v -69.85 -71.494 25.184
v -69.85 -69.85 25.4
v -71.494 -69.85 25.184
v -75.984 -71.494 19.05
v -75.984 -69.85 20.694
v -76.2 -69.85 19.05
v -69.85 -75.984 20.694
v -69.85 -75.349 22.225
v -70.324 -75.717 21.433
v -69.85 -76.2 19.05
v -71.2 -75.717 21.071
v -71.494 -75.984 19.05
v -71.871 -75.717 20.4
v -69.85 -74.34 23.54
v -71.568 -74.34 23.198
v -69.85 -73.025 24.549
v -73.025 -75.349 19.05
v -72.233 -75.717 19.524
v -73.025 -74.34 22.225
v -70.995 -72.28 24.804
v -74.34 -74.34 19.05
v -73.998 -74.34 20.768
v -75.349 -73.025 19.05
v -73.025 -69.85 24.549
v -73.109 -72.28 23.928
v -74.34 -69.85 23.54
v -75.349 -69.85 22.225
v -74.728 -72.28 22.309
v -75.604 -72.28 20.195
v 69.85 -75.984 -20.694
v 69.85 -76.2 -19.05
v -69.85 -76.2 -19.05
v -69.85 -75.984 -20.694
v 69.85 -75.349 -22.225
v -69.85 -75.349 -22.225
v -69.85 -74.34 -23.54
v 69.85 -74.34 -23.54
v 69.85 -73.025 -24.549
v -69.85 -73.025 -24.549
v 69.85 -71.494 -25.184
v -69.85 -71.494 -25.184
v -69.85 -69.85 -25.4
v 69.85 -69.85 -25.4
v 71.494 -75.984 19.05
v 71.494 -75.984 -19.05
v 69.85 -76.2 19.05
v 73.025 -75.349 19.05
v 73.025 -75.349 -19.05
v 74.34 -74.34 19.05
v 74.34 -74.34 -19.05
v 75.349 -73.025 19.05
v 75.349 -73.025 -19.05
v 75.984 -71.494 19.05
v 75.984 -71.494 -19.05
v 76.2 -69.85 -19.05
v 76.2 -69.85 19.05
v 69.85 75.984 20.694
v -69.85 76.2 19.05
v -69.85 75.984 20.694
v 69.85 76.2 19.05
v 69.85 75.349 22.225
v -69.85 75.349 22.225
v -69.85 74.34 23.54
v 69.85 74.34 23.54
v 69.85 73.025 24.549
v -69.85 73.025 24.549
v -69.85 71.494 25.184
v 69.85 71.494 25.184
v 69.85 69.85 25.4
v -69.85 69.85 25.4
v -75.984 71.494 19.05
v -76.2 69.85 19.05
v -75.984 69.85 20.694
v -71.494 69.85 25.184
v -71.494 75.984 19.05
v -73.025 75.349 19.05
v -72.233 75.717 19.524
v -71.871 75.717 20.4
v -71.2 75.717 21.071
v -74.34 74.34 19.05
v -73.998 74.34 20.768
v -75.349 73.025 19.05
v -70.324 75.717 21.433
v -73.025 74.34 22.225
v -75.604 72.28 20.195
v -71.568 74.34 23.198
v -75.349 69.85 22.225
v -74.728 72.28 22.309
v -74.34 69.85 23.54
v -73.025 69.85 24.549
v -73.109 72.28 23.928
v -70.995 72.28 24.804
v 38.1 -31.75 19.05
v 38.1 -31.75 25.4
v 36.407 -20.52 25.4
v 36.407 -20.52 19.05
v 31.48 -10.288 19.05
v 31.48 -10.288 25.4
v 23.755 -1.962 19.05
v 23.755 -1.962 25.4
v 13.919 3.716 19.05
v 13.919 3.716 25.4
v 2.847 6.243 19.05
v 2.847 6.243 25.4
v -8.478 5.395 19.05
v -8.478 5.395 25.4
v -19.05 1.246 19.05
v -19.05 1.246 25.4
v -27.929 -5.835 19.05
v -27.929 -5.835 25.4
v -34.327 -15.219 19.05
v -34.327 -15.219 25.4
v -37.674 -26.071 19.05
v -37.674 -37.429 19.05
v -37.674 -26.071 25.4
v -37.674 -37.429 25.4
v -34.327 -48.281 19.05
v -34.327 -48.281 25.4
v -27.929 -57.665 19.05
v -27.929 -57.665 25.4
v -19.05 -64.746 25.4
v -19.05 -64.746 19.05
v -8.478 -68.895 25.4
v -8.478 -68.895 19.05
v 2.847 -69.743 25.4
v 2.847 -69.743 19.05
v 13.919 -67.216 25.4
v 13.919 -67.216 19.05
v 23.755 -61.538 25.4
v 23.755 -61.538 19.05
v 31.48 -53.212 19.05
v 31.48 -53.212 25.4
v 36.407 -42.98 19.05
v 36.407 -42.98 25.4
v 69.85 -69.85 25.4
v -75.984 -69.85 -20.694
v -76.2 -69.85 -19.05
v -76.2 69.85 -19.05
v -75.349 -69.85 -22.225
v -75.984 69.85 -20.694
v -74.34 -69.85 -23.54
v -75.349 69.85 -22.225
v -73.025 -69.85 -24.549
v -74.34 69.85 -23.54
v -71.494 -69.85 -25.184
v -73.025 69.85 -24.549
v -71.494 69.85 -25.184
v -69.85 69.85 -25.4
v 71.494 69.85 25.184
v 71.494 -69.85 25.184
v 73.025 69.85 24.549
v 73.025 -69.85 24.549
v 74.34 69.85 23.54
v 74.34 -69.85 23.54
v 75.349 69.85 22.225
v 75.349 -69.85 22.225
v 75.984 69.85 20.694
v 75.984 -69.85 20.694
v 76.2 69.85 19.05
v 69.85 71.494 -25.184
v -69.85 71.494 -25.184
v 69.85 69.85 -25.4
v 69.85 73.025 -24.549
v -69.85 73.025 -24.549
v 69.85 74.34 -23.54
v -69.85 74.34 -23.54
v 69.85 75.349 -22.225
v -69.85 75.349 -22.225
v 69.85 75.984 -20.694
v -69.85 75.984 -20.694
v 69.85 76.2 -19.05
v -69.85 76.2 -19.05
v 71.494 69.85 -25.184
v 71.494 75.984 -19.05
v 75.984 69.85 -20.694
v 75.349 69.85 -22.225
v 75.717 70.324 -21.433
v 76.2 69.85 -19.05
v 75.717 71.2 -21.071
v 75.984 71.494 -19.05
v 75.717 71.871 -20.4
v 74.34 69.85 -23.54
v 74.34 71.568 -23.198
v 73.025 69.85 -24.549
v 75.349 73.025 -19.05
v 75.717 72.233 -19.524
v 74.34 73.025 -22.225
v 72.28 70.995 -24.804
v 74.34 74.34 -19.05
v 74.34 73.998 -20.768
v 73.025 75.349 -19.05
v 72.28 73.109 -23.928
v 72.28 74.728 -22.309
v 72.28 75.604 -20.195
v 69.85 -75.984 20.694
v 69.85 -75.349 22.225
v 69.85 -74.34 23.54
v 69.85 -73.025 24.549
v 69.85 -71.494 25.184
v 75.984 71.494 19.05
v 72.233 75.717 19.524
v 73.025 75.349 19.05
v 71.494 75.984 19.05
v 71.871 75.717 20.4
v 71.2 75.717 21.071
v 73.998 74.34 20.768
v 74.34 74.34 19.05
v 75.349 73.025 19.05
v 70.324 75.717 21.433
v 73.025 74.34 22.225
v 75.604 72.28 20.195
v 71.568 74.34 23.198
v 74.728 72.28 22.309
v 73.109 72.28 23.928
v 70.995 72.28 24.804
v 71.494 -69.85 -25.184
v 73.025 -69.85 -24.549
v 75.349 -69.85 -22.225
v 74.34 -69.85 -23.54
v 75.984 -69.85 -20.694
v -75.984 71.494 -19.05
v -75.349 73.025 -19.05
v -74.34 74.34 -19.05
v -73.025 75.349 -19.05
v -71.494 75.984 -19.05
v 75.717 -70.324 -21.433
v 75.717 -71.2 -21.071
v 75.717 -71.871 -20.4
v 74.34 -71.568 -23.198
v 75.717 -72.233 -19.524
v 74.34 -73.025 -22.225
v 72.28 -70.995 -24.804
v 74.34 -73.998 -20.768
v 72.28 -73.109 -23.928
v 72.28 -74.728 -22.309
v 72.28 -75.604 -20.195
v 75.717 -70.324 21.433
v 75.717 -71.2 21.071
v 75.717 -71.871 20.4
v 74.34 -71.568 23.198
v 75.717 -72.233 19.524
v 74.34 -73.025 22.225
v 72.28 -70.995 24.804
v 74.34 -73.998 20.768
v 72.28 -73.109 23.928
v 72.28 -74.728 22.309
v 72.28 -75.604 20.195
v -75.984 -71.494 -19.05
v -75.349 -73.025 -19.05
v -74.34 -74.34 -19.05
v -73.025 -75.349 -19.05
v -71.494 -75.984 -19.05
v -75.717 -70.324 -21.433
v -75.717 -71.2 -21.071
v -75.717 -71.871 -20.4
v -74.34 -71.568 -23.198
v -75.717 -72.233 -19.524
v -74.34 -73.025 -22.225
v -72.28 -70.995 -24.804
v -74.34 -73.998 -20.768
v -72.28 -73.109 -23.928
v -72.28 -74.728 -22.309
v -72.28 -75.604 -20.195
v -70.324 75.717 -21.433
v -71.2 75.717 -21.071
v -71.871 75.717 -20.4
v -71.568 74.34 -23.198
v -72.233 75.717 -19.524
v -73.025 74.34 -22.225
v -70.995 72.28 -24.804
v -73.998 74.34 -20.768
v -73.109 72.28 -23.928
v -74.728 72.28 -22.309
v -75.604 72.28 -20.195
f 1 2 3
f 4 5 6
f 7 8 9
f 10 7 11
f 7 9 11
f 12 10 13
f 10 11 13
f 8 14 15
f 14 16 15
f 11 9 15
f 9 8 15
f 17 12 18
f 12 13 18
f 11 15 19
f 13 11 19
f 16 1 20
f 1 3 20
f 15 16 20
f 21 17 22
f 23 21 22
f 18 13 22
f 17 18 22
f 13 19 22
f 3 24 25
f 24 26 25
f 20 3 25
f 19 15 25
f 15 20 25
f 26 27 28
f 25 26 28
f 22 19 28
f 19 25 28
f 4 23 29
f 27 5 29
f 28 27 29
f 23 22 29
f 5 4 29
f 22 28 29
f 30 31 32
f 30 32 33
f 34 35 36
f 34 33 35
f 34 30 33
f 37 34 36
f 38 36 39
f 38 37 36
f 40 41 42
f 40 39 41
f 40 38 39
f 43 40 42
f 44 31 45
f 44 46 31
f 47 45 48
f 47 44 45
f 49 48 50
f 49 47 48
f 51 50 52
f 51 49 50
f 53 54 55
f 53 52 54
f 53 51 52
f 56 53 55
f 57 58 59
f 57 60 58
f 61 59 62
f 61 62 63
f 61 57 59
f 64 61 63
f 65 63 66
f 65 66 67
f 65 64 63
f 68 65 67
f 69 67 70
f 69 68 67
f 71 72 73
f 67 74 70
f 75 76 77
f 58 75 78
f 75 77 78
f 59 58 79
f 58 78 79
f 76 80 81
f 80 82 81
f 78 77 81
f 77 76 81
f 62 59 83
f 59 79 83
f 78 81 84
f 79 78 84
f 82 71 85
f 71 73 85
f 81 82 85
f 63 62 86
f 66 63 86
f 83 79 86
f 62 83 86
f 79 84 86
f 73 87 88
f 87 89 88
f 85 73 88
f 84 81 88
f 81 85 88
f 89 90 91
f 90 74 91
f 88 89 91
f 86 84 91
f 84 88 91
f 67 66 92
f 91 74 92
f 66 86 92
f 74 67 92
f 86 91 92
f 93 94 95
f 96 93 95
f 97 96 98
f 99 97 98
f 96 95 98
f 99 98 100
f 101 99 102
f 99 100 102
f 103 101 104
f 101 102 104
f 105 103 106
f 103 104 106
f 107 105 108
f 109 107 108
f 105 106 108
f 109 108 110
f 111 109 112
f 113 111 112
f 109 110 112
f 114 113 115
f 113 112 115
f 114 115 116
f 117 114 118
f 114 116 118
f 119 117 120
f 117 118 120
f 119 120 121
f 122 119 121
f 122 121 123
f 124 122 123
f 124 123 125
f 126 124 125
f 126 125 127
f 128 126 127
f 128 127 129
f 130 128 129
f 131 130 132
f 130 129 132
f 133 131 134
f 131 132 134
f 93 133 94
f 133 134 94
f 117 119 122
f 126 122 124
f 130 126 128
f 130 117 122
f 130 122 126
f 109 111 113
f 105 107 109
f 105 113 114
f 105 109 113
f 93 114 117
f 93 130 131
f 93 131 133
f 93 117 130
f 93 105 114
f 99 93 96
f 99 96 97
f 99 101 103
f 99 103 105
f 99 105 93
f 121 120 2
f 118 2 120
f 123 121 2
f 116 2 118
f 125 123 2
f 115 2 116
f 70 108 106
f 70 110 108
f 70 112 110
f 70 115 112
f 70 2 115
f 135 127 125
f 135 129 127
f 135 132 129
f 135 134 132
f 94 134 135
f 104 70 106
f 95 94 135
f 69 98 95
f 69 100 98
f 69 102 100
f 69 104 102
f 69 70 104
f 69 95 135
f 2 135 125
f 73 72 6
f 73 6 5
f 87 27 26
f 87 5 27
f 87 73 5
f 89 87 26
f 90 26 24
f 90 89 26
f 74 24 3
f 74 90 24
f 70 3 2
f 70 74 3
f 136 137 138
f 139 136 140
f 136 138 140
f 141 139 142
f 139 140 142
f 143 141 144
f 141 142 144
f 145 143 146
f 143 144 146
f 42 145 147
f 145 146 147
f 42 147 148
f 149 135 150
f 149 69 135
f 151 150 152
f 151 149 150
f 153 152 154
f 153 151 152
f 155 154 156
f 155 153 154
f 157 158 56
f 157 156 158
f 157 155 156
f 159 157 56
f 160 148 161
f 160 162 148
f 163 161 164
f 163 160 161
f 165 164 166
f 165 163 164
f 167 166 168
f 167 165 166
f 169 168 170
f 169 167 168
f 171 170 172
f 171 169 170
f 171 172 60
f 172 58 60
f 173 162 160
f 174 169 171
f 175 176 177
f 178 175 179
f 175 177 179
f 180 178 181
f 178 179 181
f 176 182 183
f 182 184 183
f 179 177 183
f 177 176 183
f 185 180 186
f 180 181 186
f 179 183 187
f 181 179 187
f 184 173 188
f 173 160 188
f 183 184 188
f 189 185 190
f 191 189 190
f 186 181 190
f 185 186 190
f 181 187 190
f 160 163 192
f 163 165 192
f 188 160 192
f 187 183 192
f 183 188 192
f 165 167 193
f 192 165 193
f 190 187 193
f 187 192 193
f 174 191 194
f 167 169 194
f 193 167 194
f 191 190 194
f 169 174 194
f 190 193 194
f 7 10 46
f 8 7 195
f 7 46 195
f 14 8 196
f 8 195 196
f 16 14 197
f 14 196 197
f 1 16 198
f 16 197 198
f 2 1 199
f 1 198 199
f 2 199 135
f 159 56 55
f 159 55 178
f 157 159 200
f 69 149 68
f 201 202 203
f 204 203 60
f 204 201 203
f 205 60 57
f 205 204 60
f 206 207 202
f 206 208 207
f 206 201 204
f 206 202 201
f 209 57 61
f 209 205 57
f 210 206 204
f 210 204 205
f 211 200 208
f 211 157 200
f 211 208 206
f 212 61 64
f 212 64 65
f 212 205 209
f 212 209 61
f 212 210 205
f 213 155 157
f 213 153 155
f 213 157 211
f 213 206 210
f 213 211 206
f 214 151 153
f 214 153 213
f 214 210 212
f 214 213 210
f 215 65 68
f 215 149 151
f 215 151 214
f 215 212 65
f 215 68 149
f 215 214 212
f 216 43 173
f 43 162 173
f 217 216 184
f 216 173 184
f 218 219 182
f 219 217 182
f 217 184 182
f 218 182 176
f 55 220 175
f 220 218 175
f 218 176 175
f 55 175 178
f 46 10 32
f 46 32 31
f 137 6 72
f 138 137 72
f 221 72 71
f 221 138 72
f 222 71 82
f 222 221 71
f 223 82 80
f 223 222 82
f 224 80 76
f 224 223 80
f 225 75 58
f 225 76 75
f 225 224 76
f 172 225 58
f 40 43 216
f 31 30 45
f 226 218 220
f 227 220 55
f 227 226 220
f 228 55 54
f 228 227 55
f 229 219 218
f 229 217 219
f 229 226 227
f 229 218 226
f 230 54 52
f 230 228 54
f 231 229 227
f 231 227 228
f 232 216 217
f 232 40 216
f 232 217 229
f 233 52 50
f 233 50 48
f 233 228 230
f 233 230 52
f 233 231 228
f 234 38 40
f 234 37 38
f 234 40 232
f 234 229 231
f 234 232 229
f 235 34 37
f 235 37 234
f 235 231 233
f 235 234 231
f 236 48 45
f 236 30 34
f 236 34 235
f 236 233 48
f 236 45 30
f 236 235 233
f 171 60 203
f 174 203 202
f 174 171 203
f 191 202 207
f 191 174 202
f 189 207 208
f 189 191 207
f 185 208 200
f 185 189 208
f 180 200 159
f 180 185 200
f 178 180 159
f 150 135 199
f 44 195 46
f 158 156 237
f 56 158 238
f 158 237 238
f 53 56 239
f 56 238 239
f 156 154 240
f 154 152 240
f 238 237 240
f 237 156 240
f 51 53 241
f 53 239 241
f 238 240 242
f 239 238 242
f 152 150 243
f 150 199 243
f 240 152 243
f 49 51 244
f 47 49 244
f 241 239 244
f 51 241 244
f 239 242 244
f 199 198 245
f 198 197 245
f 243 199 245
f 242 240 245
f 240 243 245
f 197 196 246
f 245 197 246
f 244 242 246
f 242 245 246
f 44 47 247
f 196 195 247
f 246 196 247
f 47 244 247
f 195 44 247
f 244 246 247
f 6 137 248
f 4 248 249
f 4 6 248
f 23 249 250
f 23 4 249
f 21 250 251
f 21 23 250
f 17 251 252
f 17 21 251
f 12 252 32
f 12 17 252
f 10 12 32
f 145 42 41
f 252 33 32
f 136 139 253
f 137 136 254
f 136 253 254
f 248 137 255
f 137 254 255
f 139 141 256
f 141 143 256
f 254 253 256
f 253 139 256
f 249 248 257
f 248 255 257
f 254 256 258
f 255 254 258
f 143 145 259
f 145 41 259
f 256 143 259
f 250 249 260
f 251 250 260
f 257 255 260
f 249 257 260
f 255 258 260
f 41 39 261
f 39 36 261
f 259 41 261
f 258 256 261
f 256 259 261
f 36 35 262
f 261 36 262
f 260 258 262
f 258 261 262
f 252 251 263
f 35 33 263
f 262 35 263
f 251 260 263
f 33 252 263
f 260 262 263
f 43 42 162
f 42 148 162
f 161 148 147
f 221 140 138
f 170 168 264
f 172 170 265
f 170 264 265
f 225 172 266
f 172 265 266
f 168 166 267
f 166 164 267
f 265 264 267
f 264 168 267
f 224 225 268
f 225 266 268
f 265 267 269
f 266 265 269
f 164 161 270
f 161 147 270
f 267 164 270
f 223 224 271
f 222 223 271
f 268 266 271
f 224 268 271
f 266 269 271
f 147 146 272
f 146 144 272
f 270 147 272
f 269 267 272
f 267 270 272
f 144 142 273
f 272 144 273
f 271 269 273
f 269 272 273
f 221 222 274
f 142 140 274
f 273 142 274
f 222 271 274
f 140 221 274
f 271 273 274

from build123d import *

# Parameters (mm, degrees)
SKETCH1_W           = 152.4
SKETCH1_H           = 152.4
BOSS_EXTRUDE1_DEPTH = 25.4
SKETCH2_R           = 38.1
CUT_EXTRUDE1_DEPTH  = 6.35
FILLET1_R           = 6.35


with BuildPart() as part:
    # Sketch1 → Boss-Extrude1 (new, symmetric)
    with BuildSketch(Plane.XY):
        Rectangle(SKETCH1_W, SKETCH1_H)
    extrude(amount=BOSS_EXTRUDE1_DEPTH, both=True)

    # Sketch2 → Cut-Extrude1 (cut)
    with BuildSketch(Plane.XY.offset(25.4)):
        with Locations((0, -31.75)):
            Circle(SKETCH2_R)
    extrude(amount=-CUT_EXTRUDE1_DEPTH, mode=Mode.SUBTRACT)

    # Fillet1
    fillet1_edges = [part.edges().sort_by_distance(p)[0] for p in [
        (-76.2, 0, 25.4),
        (0, -76.2, 25.4),
        (76.2, 0, 25.4),
        (0, -76.2, -25.4),
        (-76.2, 0, -25.4),
        (0, 76.2, -25.4),
        (76.2, 0, -25.4),
        (76.2, -76.2, 0),
        (-76.2, -76.2, 0),
        (-76.2, 76.2, 0),
        (76.2, 76.2, 0),
        (0, 76.2, 25.4),
    ]]
    fillet(fillet1_edges, radius=FILLET1_R - 0.0001)  # a hair under: the kernel refuses the full size


solid = part.part
